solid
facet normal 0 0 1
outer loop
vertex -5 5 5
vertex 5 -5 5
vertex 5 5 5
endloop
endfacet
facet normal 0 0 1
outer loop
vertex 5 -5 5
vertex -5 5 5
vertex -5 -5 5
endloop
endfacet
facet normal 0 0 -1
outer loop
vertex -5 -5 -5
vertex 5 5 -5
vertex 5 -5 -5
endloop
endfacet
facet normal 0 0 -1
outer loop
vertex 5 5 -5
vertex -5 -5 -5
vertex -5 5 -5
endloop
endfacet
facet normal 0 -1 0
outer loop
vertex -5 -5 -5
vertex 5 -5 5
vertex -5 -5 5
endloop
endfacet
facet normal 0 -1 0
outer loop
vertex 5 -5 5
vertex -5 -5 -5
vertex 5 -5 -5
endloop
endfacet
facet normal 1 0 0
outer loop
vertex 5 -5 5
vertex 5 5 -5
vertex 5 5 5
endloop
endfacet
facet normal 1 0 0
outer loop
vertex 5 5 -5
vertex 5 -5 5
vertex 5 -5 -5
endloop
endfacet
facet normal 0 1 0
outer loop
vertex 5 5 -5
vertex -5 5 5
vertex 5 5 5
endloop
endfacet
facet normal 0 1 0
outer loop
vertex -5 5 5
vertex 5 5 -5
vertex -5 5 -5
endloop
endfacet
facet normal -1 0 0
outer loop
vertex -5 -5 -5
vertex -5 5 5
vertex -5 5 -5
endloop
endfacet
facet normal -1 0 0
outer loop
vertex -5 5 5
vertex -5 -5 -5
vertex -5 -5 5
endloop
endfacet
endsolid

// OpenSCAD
// file: lib/widget.scad
module widget() {
  cube([10, 10, 10], center = true);
}

// Top-level invocation so this file renders standalone in the editor.
// Safe under `use <…>` from main.scad — top-level calls in `use`d files
// are not executed by the importing file.
widget();
// main file
// Always import library .scad files via `use <…>` — it brings in modules
// and functions but does NOT execute top-level invocations from the
// imported file, so a library that calls `widget();` at its top level
// still renders standalone without duplicating geometry in the assembly.
use <lib/widget.scad>

widget();
